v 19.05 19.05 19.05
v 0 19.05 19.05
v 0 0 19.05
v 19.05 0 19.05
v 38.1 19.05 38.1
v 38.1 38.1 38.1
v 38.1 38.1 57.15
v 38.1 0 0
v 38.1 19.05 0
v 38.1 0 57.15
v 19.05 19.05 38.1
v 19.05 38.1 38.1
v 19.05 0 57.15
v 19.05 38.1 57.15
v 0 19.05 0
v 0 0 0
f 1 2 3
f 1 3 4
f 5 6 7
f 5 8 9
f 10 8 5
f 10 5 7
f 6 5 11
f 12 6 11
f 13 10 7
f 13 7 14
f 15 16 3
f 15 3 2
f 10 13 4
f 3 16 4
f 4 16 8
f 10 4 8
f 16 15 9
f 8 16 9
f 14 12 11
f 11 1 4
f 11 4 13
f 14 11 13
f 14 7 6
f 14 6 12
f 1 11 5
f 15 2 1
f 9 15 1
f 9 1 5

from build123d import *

# Parameters (mm, degrees)
F0_W     = 38.1
F0_H     = 19.05
F1_DEPTH = 19.05
F2_W     = 19.05
F2_H     = 19.05
F3_DEPTH = 38.1
F4_W     = 19.05
F4_H     = 19.05
F5_DEPTH = 19.05


with BuildPart() as f1:
    # F0 (on Top) → F1 (new body)
    with BuildSketch(Plane.XY):
        with Locations((19.05, 9.525)):
            Rectangle(F0_W, F0_H)
    extrude(amount=F1_DEPTH)

    # F2 (on face) → F3 (join)
    with BuildSketch(Plane.XY.offset(19.05)):
        with Locations((28.575, 9.525)):
            Rectangle(F2_W, F2_H)
    extrude(amount=F3_DEPTH)

    # F4 (on face) → F5 (join)
    with BuildSketch(Plane(origin=(0, 19.05, 0), x_dir=(-1, 0, 0), z_dir=(0, 1, 0))):
        with Locations((-28.575, 47.625)):
            Rectangle(F4_W, F4_H)
    extrude(amount=F5_DEPTH)


solid = f1.part
